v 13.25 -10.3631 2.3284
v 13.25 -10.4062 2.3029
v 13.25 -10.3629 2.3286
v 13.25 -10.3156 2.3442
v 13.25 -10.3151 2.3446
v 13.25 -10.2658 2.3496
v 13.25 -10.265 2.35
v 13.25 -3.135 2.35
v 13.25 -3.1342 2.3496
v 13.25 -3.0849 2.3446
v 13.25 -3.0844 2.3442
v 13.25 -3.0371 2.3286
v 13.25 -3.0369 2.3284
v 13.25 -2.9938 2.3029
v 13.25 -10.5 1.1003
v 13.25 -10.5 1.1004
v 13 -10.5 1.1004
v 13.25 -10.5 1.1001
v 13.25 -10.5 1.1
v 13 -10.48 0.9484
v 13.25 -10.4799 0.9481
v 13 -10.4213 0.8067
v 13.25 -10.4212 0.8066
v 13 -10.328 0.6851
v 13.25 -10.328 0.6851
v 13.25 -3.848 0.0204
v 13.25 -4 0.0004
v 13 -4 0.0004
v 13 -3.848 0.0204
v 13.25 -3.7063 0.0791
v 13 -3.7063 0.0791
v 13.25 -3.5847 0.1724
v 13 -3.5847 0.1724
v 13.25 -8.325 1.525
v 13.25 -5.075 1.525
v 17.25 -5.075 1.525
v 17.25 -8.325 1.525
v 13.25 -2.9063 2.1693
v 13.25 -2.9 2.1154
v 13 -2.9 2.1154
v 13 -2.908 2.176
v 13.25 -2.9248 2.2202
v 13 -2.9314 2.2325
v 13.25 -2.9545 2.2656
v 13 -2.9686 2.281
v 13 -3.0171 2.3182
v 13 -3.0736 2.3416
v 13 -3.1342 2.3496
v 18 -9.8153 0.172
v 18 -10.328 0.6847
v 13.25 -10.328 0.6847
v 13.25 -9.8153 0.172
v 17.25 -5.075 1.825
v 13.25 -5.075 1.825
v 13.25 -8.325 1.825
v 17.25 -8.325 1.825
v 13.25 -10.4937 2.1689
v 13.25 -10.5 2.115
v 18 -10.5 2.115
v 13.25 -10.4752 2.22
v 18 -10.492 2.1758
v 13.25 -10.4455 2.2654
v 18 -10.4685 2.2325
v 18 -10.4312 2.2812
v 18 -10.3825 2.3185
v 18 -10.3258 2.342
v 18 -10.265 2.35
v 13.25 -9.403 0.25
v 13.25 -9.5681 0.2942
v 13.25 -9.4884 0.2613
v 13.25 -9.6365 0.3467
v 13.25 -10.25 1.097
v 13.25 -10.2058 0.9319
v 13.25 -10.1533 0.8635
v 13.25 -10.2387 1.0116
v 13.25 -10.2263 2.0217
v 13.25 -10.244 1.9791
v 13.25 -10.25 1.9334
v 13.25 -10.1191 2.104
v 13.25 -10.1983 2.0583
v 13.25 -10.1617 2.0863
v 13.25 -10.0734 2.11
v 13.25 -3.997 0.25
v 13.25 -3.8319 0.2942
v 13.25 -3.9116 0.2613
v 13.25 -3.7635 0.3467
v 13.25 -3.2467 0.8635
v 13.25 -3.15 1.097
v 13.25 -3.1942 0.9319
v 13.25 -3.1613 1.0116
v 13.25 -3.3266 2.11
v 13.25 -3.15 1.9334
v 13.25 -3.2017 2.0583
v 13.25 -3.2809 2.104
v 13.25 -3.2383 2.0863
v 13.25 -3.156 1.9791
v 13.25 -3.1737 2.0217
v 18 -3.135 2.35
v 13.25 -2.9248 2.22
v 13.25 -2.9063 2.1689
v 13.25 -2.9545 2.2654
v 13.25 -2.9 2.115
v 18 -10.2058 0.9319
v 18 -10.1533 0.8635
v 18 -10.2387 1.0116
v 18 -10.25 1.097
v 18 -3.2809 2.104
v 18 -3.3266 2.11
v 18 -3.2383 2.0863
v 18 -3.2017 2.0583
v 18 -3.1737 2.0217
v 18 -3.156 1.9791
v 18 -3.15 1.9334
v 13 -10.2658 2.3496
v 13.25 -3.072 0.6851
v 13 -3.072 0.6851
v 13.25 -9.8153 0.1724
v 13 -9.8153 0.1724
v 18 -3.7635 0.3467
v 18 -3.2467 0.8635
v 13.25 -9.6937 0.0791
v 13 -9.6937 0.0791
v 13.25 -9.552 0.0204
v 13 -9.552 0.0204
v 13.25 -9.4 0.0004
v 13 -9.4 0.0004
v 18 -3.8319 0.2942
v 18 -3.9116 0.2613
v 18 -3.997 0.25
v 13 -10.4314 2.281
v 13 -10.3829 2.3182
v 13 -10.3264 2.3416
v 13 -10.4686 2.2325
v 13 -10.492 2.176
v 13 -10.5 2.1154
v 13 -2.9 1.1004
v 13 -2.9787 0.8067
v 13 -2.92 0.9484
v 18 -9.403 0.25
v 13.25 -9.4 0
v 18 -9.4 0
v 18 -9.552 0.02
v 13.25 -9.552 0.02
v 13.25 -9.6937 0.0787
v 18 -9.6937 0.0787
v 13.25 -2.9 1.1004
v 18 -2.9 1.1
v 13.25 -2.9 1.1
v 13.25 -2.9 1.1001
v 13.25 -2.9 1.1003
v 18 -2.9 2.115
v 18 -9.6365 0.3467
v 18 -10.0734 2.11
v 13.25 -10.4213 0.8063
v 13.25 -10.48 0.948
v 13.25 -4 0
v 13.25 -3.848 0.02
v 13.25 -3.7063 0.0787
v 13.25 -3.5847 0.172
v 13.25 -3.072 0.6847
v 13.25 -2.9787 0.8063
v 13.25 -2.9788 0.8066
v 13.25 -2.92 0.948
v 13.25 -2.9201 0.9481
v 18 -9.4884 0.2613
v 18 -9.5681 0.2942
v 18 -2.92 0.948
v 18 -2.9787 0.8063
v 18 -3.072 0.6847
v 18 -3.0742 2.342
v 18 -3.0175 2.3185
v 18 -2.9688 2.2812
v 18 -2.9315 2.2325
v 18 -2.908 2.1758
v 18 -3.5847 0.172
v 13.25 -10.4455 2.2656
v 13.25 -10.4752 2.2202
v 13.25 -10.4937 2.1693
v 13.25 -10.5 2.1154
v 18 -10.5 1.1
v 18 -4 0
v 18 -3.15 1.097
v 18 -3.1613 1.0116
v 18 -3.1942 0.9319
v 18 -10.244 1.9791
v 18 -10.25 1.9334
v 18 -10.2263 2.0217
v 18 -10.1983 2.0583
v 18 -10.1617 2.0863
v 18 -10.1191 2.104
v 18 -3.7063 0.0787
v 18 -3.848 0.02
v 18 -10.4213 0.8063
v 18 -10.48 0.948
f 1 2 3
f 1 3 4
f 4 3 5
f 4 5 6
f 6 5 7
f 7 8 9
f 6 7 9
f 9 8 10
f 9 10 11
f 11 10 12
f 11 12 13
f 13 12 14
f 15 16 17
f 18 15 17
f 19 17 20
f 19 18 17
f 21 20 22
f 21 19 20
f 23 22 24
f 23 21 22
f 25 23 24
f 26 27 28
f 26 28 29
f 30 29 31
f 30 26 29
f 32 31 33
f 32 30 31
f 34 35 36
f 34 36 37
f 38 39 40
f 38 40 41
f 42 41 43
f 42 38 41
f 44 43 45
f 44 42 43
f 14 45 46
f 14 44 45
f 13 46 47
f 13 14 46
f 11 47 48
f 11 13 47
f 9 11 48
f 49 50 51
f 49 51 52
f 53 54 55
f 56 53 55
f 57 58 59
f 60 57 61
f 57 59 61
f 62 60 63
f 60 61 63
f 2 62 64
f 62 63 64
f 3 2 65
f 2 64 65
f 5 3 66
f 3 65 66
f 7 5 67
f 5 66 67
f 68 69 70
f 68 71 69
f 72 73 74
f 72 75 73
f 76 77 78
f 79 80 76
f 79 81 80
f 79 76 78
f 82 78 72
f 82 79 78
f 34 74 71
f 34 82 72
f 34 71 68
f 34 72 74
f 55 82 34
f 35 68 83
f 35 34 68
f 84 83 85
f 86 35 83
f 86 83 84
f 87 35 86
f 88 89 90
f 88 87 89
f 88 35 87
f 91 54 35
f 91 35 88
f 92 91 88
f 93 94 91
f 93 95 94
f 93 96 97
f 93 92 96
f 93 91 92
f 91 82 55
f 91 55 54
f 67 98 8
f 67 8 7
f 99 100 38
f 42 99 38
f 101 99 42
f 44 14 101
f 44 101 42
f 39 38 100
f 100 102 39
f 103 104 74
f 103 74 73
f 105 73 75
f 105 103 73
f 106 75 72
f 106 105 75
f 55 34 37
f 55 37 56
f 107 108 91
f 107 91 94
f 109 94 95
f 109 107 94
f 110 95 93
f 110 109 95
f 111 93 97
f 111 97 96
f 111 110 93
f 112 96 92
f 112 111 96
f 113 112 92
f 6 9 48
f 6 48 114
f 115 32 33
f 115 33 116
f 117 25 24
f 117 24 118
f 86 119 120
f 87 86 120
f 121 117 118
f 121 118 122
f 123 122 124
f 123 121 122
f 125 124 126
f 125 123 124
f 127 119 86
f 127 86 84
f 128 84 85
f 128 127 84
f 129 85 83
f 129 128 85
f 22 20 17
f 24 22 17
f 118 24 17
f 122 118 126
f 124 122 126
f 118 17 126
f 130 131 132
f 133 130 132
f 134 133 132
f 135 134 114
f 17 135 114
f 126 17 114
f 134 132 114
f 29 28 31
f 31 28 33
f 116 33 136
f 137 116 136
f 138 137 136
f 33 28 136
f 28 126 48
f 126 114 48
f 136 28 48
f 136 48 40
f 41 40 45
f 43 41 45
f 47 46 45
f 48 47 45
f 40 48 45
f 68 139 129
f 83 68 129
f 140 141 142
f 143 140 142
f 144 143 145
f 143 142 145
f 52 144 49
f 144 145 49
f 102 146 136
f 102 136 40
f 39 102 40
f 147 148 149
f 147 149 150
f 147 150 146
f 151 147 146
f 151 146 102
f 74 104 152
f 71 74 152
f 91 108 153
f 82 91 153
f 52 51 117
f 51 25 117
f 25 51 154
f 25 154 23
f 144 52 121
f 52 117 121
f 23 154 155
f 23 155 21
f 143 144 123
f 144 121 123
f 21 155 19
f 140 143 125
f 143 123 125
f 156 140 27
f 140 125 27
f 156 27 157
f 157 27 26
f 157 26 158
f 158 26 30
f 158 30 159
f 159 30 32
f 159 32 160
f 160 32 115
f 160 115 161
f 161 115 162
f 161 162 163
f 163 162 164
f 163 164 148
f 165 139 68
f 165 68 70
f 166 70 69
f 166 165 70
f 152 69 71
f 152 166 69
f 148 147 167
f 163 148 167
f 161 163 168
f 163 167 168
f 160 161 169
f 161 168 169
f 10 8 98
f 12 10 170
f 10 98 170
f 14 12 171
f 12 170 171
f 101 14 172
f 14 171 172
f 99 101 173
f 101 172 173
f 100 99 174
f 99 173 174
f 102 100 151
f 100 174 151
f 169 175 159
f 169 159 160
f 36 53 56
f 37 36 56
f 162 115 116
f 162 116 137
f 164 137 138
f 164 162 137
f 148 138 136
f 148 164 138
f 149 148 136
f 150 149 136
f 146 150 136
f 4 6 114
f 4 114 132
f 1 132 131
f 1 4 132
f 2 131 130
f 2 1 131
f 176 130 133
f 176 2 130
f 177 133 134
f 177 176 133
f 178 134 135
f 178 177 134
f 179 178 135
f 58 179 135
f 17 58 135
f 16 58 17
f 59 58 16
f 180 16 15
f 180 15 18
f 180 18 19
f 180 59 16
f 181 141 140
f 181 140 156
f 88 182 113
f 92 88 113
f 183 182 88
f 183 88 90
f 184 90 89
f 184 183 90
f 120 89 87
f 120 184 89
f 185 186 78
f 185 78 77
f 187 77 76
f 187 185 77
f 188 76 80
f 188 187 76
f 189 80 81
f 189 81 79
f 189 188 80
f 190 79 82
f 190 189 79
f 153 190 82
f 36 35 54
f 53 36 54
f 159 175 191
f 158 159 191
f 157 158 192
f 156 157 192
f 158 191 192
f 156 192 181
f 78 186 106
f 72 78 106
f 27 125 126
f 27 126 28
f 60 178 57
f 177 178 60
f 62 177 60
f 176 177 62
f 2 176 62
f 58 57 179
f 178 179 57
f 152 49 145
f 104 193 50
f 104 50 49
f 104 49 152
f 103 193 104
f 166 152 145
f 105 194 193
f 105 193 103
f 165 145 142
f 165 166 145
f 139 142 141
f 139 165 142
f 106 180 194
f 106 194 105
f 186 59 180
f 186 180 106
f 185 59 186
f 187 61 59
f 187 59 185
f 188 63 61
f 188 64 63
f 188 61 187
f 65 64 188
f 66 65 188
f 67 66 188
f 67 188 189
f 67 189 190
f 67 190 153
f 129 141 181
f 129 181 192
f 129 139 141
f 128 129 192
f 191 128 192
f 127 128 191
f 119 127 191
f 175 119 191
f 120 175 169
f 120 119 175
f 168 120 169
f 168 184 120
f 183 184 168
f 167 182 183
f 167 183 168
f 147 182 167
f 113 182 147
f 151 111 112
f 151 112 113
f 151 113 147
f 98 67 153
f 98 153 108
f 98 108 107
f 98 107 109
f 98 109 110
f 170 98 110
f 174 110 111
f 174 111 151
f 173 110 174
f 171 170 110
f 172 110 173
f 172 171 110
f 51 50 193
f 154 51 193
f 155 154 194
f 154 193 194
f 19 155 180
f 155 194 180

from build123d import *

# Parameters (mm, degrees)
SKETCH077_W                   = 3.25
SKETCH077_H                   = 0.3
PAD102_DEPTH                  = 4
PAD101_DEPTH                  = 0.25
PAD100_DEPTH                  = 4.75
PAD023BODY001_PLACEMENT_ANGLE = 90


with BuildPart() as part:
    # Sketch077 → Pad102 (new body)
    with BuildSketch(Plane(origin=(0, 1.75, 0), x_dir=(-1, 0, 0), z_dir=(0, 1, 0))):
        with Locations((0, 0.5)):
            Rectangle(SKETCH077_W, SKETCH077_H)
    extrude(amount=-PAD102_DEPTH)

    # Sketch076 → Pad101 (join)
    with BuildSketch(Plane.XZ.offset(-1.75)):
        with BuildLine():
            Line((3.565827, 1.174586), (-3.565827, 1.174586))
            ThreePointArc((-3.565827, 1.174586), (-3.731412, 1.105999), (-3.8, 0.940414))
            Line((-3.8, -0.074586), (-3.8, 0.940414))
            ThreePointArc((-3.8, -0.074586), (-3.755291, -0.299355), (-3.62797, -0.489904))
            Line((-3.62797, -0.489904), (-3.115317, -1.002556))
            ThreePointArc((-3.115317, -1.002556), (-2.924768, -1.129877), (-2.7, -1.174586))
            Line((-2.7, -1.174586), (2.7, -1.174586))
            ThreePointArc((2.7, -1.174586), (2.924768, -1.129877), (3.115317, -1.002556))
            Line((3.115317, -1.002556), (3.62797, -0.489904))
            ThreePointArc((3.62797, -0.489904), (3.755291, -0.299355), (3.8, -0.074586))
            Line((3.8, 0.940414), (3.8, -0.074586))
            ThreePointArc((3.8, 0.940414), (3.731412, 1.105999), (3.565827, 1.174586))
        make_face()
    extrude(amount=-PAD101_DEPTH)

    # Sketch078 → Pad100 (join)
    with BuildSketch(Plane(origin=(0, -3, 0), x_dir=(-1, 0, 0), z_dir=(0, 1, 0))):
        with BuildLine():
            Line((-3.565, 1.175), (3.565, 1.175))
            ThreePointArc((3.8, 0.94), (3.73117, 1.10617), (3.565, 1.175))
            Line((3.8, 0.94), (3.8, -0.075))
            ThreePointArc((3.62797, -0.490317), (3.755291, -0.299768), (3.8, -0.075))
            Line((3.62797, -0.490317), (3.115317, -1.00297))
            ThreePointArc((2.7, -1.175), (2.924768, -1.130291), (3.115317, -1.00297))
            Line((2.7, -1.175), (-2.7, -1.175))
            ThreePointArc((-3.115317, -1.00297), (-2.924768, -1.130291), (-2.7, -1.175))
            Line((-3.115317, -1.00297), (-3.62797, -0.490317))
            ThreePointArc((-3.8, -0.075), (-3.755291, -0.299768), (-3.62797, -0.490317))
            Line((-3.8, -0.075), (-3.8, 0.94))
            ThreePointArc((-3.565, 1.175), (-3.73117, 1.10617), (-3.8, 0.94))
        make_face()
        with BuildLine():
            Line((-3.373361, 0.935), (3.373361, 0.935))
            ThreePointArc((3.55, 0.758361), (3.498264, 0.883264), (3.373361, 0.935))
            Line((3.55, 0.758361), (3.55, -0.077967))
            ThreePointArc((3.453274, -0.311484), (3.524862, -0.204346), (3.55, -0.077967))
            Line((3.453274, -0.311484), (2.936484, -0.828274))
            ThreePointArc((2.702967, -0.925), (2.829346, -0.899862), (2.936484, -0.828274))
            Line((2.702967, -0.925), (-2.702967, -0.925))
            ThreePointArc((-2.936484, -0.828274), (-2.829346, -0.899862), (-2.702967, -0.925))
            Line((-2.936484, -0.828274), (-3.453274, -0.311484))
            ThreePointArc((-3.55, -0.077967), (-3.524862, -0.204346), (-3.453274, -0.311484))
            Line((-3.55, -0.077967), (-3.55, 0.758361))
            ThreePointArc((-3.373361, 0.935), (-3.498264, 0.883264), (-3.55, 0.758361))
        make_face(mode=Mode.SUBTRACT)
    extrude(amount=PAD100_DEPTH)


with BuildPart() as part_1:
    # Pad023Body001 placement: moved
    add(part.part.moved(Location((15, -6.7, 1.175))).rotate(Axis((15, -6.7, 1.175), (0, 0, 1)), PAD023BODY001_PLACEMENT_ANGLE))


solid = part_1.part
